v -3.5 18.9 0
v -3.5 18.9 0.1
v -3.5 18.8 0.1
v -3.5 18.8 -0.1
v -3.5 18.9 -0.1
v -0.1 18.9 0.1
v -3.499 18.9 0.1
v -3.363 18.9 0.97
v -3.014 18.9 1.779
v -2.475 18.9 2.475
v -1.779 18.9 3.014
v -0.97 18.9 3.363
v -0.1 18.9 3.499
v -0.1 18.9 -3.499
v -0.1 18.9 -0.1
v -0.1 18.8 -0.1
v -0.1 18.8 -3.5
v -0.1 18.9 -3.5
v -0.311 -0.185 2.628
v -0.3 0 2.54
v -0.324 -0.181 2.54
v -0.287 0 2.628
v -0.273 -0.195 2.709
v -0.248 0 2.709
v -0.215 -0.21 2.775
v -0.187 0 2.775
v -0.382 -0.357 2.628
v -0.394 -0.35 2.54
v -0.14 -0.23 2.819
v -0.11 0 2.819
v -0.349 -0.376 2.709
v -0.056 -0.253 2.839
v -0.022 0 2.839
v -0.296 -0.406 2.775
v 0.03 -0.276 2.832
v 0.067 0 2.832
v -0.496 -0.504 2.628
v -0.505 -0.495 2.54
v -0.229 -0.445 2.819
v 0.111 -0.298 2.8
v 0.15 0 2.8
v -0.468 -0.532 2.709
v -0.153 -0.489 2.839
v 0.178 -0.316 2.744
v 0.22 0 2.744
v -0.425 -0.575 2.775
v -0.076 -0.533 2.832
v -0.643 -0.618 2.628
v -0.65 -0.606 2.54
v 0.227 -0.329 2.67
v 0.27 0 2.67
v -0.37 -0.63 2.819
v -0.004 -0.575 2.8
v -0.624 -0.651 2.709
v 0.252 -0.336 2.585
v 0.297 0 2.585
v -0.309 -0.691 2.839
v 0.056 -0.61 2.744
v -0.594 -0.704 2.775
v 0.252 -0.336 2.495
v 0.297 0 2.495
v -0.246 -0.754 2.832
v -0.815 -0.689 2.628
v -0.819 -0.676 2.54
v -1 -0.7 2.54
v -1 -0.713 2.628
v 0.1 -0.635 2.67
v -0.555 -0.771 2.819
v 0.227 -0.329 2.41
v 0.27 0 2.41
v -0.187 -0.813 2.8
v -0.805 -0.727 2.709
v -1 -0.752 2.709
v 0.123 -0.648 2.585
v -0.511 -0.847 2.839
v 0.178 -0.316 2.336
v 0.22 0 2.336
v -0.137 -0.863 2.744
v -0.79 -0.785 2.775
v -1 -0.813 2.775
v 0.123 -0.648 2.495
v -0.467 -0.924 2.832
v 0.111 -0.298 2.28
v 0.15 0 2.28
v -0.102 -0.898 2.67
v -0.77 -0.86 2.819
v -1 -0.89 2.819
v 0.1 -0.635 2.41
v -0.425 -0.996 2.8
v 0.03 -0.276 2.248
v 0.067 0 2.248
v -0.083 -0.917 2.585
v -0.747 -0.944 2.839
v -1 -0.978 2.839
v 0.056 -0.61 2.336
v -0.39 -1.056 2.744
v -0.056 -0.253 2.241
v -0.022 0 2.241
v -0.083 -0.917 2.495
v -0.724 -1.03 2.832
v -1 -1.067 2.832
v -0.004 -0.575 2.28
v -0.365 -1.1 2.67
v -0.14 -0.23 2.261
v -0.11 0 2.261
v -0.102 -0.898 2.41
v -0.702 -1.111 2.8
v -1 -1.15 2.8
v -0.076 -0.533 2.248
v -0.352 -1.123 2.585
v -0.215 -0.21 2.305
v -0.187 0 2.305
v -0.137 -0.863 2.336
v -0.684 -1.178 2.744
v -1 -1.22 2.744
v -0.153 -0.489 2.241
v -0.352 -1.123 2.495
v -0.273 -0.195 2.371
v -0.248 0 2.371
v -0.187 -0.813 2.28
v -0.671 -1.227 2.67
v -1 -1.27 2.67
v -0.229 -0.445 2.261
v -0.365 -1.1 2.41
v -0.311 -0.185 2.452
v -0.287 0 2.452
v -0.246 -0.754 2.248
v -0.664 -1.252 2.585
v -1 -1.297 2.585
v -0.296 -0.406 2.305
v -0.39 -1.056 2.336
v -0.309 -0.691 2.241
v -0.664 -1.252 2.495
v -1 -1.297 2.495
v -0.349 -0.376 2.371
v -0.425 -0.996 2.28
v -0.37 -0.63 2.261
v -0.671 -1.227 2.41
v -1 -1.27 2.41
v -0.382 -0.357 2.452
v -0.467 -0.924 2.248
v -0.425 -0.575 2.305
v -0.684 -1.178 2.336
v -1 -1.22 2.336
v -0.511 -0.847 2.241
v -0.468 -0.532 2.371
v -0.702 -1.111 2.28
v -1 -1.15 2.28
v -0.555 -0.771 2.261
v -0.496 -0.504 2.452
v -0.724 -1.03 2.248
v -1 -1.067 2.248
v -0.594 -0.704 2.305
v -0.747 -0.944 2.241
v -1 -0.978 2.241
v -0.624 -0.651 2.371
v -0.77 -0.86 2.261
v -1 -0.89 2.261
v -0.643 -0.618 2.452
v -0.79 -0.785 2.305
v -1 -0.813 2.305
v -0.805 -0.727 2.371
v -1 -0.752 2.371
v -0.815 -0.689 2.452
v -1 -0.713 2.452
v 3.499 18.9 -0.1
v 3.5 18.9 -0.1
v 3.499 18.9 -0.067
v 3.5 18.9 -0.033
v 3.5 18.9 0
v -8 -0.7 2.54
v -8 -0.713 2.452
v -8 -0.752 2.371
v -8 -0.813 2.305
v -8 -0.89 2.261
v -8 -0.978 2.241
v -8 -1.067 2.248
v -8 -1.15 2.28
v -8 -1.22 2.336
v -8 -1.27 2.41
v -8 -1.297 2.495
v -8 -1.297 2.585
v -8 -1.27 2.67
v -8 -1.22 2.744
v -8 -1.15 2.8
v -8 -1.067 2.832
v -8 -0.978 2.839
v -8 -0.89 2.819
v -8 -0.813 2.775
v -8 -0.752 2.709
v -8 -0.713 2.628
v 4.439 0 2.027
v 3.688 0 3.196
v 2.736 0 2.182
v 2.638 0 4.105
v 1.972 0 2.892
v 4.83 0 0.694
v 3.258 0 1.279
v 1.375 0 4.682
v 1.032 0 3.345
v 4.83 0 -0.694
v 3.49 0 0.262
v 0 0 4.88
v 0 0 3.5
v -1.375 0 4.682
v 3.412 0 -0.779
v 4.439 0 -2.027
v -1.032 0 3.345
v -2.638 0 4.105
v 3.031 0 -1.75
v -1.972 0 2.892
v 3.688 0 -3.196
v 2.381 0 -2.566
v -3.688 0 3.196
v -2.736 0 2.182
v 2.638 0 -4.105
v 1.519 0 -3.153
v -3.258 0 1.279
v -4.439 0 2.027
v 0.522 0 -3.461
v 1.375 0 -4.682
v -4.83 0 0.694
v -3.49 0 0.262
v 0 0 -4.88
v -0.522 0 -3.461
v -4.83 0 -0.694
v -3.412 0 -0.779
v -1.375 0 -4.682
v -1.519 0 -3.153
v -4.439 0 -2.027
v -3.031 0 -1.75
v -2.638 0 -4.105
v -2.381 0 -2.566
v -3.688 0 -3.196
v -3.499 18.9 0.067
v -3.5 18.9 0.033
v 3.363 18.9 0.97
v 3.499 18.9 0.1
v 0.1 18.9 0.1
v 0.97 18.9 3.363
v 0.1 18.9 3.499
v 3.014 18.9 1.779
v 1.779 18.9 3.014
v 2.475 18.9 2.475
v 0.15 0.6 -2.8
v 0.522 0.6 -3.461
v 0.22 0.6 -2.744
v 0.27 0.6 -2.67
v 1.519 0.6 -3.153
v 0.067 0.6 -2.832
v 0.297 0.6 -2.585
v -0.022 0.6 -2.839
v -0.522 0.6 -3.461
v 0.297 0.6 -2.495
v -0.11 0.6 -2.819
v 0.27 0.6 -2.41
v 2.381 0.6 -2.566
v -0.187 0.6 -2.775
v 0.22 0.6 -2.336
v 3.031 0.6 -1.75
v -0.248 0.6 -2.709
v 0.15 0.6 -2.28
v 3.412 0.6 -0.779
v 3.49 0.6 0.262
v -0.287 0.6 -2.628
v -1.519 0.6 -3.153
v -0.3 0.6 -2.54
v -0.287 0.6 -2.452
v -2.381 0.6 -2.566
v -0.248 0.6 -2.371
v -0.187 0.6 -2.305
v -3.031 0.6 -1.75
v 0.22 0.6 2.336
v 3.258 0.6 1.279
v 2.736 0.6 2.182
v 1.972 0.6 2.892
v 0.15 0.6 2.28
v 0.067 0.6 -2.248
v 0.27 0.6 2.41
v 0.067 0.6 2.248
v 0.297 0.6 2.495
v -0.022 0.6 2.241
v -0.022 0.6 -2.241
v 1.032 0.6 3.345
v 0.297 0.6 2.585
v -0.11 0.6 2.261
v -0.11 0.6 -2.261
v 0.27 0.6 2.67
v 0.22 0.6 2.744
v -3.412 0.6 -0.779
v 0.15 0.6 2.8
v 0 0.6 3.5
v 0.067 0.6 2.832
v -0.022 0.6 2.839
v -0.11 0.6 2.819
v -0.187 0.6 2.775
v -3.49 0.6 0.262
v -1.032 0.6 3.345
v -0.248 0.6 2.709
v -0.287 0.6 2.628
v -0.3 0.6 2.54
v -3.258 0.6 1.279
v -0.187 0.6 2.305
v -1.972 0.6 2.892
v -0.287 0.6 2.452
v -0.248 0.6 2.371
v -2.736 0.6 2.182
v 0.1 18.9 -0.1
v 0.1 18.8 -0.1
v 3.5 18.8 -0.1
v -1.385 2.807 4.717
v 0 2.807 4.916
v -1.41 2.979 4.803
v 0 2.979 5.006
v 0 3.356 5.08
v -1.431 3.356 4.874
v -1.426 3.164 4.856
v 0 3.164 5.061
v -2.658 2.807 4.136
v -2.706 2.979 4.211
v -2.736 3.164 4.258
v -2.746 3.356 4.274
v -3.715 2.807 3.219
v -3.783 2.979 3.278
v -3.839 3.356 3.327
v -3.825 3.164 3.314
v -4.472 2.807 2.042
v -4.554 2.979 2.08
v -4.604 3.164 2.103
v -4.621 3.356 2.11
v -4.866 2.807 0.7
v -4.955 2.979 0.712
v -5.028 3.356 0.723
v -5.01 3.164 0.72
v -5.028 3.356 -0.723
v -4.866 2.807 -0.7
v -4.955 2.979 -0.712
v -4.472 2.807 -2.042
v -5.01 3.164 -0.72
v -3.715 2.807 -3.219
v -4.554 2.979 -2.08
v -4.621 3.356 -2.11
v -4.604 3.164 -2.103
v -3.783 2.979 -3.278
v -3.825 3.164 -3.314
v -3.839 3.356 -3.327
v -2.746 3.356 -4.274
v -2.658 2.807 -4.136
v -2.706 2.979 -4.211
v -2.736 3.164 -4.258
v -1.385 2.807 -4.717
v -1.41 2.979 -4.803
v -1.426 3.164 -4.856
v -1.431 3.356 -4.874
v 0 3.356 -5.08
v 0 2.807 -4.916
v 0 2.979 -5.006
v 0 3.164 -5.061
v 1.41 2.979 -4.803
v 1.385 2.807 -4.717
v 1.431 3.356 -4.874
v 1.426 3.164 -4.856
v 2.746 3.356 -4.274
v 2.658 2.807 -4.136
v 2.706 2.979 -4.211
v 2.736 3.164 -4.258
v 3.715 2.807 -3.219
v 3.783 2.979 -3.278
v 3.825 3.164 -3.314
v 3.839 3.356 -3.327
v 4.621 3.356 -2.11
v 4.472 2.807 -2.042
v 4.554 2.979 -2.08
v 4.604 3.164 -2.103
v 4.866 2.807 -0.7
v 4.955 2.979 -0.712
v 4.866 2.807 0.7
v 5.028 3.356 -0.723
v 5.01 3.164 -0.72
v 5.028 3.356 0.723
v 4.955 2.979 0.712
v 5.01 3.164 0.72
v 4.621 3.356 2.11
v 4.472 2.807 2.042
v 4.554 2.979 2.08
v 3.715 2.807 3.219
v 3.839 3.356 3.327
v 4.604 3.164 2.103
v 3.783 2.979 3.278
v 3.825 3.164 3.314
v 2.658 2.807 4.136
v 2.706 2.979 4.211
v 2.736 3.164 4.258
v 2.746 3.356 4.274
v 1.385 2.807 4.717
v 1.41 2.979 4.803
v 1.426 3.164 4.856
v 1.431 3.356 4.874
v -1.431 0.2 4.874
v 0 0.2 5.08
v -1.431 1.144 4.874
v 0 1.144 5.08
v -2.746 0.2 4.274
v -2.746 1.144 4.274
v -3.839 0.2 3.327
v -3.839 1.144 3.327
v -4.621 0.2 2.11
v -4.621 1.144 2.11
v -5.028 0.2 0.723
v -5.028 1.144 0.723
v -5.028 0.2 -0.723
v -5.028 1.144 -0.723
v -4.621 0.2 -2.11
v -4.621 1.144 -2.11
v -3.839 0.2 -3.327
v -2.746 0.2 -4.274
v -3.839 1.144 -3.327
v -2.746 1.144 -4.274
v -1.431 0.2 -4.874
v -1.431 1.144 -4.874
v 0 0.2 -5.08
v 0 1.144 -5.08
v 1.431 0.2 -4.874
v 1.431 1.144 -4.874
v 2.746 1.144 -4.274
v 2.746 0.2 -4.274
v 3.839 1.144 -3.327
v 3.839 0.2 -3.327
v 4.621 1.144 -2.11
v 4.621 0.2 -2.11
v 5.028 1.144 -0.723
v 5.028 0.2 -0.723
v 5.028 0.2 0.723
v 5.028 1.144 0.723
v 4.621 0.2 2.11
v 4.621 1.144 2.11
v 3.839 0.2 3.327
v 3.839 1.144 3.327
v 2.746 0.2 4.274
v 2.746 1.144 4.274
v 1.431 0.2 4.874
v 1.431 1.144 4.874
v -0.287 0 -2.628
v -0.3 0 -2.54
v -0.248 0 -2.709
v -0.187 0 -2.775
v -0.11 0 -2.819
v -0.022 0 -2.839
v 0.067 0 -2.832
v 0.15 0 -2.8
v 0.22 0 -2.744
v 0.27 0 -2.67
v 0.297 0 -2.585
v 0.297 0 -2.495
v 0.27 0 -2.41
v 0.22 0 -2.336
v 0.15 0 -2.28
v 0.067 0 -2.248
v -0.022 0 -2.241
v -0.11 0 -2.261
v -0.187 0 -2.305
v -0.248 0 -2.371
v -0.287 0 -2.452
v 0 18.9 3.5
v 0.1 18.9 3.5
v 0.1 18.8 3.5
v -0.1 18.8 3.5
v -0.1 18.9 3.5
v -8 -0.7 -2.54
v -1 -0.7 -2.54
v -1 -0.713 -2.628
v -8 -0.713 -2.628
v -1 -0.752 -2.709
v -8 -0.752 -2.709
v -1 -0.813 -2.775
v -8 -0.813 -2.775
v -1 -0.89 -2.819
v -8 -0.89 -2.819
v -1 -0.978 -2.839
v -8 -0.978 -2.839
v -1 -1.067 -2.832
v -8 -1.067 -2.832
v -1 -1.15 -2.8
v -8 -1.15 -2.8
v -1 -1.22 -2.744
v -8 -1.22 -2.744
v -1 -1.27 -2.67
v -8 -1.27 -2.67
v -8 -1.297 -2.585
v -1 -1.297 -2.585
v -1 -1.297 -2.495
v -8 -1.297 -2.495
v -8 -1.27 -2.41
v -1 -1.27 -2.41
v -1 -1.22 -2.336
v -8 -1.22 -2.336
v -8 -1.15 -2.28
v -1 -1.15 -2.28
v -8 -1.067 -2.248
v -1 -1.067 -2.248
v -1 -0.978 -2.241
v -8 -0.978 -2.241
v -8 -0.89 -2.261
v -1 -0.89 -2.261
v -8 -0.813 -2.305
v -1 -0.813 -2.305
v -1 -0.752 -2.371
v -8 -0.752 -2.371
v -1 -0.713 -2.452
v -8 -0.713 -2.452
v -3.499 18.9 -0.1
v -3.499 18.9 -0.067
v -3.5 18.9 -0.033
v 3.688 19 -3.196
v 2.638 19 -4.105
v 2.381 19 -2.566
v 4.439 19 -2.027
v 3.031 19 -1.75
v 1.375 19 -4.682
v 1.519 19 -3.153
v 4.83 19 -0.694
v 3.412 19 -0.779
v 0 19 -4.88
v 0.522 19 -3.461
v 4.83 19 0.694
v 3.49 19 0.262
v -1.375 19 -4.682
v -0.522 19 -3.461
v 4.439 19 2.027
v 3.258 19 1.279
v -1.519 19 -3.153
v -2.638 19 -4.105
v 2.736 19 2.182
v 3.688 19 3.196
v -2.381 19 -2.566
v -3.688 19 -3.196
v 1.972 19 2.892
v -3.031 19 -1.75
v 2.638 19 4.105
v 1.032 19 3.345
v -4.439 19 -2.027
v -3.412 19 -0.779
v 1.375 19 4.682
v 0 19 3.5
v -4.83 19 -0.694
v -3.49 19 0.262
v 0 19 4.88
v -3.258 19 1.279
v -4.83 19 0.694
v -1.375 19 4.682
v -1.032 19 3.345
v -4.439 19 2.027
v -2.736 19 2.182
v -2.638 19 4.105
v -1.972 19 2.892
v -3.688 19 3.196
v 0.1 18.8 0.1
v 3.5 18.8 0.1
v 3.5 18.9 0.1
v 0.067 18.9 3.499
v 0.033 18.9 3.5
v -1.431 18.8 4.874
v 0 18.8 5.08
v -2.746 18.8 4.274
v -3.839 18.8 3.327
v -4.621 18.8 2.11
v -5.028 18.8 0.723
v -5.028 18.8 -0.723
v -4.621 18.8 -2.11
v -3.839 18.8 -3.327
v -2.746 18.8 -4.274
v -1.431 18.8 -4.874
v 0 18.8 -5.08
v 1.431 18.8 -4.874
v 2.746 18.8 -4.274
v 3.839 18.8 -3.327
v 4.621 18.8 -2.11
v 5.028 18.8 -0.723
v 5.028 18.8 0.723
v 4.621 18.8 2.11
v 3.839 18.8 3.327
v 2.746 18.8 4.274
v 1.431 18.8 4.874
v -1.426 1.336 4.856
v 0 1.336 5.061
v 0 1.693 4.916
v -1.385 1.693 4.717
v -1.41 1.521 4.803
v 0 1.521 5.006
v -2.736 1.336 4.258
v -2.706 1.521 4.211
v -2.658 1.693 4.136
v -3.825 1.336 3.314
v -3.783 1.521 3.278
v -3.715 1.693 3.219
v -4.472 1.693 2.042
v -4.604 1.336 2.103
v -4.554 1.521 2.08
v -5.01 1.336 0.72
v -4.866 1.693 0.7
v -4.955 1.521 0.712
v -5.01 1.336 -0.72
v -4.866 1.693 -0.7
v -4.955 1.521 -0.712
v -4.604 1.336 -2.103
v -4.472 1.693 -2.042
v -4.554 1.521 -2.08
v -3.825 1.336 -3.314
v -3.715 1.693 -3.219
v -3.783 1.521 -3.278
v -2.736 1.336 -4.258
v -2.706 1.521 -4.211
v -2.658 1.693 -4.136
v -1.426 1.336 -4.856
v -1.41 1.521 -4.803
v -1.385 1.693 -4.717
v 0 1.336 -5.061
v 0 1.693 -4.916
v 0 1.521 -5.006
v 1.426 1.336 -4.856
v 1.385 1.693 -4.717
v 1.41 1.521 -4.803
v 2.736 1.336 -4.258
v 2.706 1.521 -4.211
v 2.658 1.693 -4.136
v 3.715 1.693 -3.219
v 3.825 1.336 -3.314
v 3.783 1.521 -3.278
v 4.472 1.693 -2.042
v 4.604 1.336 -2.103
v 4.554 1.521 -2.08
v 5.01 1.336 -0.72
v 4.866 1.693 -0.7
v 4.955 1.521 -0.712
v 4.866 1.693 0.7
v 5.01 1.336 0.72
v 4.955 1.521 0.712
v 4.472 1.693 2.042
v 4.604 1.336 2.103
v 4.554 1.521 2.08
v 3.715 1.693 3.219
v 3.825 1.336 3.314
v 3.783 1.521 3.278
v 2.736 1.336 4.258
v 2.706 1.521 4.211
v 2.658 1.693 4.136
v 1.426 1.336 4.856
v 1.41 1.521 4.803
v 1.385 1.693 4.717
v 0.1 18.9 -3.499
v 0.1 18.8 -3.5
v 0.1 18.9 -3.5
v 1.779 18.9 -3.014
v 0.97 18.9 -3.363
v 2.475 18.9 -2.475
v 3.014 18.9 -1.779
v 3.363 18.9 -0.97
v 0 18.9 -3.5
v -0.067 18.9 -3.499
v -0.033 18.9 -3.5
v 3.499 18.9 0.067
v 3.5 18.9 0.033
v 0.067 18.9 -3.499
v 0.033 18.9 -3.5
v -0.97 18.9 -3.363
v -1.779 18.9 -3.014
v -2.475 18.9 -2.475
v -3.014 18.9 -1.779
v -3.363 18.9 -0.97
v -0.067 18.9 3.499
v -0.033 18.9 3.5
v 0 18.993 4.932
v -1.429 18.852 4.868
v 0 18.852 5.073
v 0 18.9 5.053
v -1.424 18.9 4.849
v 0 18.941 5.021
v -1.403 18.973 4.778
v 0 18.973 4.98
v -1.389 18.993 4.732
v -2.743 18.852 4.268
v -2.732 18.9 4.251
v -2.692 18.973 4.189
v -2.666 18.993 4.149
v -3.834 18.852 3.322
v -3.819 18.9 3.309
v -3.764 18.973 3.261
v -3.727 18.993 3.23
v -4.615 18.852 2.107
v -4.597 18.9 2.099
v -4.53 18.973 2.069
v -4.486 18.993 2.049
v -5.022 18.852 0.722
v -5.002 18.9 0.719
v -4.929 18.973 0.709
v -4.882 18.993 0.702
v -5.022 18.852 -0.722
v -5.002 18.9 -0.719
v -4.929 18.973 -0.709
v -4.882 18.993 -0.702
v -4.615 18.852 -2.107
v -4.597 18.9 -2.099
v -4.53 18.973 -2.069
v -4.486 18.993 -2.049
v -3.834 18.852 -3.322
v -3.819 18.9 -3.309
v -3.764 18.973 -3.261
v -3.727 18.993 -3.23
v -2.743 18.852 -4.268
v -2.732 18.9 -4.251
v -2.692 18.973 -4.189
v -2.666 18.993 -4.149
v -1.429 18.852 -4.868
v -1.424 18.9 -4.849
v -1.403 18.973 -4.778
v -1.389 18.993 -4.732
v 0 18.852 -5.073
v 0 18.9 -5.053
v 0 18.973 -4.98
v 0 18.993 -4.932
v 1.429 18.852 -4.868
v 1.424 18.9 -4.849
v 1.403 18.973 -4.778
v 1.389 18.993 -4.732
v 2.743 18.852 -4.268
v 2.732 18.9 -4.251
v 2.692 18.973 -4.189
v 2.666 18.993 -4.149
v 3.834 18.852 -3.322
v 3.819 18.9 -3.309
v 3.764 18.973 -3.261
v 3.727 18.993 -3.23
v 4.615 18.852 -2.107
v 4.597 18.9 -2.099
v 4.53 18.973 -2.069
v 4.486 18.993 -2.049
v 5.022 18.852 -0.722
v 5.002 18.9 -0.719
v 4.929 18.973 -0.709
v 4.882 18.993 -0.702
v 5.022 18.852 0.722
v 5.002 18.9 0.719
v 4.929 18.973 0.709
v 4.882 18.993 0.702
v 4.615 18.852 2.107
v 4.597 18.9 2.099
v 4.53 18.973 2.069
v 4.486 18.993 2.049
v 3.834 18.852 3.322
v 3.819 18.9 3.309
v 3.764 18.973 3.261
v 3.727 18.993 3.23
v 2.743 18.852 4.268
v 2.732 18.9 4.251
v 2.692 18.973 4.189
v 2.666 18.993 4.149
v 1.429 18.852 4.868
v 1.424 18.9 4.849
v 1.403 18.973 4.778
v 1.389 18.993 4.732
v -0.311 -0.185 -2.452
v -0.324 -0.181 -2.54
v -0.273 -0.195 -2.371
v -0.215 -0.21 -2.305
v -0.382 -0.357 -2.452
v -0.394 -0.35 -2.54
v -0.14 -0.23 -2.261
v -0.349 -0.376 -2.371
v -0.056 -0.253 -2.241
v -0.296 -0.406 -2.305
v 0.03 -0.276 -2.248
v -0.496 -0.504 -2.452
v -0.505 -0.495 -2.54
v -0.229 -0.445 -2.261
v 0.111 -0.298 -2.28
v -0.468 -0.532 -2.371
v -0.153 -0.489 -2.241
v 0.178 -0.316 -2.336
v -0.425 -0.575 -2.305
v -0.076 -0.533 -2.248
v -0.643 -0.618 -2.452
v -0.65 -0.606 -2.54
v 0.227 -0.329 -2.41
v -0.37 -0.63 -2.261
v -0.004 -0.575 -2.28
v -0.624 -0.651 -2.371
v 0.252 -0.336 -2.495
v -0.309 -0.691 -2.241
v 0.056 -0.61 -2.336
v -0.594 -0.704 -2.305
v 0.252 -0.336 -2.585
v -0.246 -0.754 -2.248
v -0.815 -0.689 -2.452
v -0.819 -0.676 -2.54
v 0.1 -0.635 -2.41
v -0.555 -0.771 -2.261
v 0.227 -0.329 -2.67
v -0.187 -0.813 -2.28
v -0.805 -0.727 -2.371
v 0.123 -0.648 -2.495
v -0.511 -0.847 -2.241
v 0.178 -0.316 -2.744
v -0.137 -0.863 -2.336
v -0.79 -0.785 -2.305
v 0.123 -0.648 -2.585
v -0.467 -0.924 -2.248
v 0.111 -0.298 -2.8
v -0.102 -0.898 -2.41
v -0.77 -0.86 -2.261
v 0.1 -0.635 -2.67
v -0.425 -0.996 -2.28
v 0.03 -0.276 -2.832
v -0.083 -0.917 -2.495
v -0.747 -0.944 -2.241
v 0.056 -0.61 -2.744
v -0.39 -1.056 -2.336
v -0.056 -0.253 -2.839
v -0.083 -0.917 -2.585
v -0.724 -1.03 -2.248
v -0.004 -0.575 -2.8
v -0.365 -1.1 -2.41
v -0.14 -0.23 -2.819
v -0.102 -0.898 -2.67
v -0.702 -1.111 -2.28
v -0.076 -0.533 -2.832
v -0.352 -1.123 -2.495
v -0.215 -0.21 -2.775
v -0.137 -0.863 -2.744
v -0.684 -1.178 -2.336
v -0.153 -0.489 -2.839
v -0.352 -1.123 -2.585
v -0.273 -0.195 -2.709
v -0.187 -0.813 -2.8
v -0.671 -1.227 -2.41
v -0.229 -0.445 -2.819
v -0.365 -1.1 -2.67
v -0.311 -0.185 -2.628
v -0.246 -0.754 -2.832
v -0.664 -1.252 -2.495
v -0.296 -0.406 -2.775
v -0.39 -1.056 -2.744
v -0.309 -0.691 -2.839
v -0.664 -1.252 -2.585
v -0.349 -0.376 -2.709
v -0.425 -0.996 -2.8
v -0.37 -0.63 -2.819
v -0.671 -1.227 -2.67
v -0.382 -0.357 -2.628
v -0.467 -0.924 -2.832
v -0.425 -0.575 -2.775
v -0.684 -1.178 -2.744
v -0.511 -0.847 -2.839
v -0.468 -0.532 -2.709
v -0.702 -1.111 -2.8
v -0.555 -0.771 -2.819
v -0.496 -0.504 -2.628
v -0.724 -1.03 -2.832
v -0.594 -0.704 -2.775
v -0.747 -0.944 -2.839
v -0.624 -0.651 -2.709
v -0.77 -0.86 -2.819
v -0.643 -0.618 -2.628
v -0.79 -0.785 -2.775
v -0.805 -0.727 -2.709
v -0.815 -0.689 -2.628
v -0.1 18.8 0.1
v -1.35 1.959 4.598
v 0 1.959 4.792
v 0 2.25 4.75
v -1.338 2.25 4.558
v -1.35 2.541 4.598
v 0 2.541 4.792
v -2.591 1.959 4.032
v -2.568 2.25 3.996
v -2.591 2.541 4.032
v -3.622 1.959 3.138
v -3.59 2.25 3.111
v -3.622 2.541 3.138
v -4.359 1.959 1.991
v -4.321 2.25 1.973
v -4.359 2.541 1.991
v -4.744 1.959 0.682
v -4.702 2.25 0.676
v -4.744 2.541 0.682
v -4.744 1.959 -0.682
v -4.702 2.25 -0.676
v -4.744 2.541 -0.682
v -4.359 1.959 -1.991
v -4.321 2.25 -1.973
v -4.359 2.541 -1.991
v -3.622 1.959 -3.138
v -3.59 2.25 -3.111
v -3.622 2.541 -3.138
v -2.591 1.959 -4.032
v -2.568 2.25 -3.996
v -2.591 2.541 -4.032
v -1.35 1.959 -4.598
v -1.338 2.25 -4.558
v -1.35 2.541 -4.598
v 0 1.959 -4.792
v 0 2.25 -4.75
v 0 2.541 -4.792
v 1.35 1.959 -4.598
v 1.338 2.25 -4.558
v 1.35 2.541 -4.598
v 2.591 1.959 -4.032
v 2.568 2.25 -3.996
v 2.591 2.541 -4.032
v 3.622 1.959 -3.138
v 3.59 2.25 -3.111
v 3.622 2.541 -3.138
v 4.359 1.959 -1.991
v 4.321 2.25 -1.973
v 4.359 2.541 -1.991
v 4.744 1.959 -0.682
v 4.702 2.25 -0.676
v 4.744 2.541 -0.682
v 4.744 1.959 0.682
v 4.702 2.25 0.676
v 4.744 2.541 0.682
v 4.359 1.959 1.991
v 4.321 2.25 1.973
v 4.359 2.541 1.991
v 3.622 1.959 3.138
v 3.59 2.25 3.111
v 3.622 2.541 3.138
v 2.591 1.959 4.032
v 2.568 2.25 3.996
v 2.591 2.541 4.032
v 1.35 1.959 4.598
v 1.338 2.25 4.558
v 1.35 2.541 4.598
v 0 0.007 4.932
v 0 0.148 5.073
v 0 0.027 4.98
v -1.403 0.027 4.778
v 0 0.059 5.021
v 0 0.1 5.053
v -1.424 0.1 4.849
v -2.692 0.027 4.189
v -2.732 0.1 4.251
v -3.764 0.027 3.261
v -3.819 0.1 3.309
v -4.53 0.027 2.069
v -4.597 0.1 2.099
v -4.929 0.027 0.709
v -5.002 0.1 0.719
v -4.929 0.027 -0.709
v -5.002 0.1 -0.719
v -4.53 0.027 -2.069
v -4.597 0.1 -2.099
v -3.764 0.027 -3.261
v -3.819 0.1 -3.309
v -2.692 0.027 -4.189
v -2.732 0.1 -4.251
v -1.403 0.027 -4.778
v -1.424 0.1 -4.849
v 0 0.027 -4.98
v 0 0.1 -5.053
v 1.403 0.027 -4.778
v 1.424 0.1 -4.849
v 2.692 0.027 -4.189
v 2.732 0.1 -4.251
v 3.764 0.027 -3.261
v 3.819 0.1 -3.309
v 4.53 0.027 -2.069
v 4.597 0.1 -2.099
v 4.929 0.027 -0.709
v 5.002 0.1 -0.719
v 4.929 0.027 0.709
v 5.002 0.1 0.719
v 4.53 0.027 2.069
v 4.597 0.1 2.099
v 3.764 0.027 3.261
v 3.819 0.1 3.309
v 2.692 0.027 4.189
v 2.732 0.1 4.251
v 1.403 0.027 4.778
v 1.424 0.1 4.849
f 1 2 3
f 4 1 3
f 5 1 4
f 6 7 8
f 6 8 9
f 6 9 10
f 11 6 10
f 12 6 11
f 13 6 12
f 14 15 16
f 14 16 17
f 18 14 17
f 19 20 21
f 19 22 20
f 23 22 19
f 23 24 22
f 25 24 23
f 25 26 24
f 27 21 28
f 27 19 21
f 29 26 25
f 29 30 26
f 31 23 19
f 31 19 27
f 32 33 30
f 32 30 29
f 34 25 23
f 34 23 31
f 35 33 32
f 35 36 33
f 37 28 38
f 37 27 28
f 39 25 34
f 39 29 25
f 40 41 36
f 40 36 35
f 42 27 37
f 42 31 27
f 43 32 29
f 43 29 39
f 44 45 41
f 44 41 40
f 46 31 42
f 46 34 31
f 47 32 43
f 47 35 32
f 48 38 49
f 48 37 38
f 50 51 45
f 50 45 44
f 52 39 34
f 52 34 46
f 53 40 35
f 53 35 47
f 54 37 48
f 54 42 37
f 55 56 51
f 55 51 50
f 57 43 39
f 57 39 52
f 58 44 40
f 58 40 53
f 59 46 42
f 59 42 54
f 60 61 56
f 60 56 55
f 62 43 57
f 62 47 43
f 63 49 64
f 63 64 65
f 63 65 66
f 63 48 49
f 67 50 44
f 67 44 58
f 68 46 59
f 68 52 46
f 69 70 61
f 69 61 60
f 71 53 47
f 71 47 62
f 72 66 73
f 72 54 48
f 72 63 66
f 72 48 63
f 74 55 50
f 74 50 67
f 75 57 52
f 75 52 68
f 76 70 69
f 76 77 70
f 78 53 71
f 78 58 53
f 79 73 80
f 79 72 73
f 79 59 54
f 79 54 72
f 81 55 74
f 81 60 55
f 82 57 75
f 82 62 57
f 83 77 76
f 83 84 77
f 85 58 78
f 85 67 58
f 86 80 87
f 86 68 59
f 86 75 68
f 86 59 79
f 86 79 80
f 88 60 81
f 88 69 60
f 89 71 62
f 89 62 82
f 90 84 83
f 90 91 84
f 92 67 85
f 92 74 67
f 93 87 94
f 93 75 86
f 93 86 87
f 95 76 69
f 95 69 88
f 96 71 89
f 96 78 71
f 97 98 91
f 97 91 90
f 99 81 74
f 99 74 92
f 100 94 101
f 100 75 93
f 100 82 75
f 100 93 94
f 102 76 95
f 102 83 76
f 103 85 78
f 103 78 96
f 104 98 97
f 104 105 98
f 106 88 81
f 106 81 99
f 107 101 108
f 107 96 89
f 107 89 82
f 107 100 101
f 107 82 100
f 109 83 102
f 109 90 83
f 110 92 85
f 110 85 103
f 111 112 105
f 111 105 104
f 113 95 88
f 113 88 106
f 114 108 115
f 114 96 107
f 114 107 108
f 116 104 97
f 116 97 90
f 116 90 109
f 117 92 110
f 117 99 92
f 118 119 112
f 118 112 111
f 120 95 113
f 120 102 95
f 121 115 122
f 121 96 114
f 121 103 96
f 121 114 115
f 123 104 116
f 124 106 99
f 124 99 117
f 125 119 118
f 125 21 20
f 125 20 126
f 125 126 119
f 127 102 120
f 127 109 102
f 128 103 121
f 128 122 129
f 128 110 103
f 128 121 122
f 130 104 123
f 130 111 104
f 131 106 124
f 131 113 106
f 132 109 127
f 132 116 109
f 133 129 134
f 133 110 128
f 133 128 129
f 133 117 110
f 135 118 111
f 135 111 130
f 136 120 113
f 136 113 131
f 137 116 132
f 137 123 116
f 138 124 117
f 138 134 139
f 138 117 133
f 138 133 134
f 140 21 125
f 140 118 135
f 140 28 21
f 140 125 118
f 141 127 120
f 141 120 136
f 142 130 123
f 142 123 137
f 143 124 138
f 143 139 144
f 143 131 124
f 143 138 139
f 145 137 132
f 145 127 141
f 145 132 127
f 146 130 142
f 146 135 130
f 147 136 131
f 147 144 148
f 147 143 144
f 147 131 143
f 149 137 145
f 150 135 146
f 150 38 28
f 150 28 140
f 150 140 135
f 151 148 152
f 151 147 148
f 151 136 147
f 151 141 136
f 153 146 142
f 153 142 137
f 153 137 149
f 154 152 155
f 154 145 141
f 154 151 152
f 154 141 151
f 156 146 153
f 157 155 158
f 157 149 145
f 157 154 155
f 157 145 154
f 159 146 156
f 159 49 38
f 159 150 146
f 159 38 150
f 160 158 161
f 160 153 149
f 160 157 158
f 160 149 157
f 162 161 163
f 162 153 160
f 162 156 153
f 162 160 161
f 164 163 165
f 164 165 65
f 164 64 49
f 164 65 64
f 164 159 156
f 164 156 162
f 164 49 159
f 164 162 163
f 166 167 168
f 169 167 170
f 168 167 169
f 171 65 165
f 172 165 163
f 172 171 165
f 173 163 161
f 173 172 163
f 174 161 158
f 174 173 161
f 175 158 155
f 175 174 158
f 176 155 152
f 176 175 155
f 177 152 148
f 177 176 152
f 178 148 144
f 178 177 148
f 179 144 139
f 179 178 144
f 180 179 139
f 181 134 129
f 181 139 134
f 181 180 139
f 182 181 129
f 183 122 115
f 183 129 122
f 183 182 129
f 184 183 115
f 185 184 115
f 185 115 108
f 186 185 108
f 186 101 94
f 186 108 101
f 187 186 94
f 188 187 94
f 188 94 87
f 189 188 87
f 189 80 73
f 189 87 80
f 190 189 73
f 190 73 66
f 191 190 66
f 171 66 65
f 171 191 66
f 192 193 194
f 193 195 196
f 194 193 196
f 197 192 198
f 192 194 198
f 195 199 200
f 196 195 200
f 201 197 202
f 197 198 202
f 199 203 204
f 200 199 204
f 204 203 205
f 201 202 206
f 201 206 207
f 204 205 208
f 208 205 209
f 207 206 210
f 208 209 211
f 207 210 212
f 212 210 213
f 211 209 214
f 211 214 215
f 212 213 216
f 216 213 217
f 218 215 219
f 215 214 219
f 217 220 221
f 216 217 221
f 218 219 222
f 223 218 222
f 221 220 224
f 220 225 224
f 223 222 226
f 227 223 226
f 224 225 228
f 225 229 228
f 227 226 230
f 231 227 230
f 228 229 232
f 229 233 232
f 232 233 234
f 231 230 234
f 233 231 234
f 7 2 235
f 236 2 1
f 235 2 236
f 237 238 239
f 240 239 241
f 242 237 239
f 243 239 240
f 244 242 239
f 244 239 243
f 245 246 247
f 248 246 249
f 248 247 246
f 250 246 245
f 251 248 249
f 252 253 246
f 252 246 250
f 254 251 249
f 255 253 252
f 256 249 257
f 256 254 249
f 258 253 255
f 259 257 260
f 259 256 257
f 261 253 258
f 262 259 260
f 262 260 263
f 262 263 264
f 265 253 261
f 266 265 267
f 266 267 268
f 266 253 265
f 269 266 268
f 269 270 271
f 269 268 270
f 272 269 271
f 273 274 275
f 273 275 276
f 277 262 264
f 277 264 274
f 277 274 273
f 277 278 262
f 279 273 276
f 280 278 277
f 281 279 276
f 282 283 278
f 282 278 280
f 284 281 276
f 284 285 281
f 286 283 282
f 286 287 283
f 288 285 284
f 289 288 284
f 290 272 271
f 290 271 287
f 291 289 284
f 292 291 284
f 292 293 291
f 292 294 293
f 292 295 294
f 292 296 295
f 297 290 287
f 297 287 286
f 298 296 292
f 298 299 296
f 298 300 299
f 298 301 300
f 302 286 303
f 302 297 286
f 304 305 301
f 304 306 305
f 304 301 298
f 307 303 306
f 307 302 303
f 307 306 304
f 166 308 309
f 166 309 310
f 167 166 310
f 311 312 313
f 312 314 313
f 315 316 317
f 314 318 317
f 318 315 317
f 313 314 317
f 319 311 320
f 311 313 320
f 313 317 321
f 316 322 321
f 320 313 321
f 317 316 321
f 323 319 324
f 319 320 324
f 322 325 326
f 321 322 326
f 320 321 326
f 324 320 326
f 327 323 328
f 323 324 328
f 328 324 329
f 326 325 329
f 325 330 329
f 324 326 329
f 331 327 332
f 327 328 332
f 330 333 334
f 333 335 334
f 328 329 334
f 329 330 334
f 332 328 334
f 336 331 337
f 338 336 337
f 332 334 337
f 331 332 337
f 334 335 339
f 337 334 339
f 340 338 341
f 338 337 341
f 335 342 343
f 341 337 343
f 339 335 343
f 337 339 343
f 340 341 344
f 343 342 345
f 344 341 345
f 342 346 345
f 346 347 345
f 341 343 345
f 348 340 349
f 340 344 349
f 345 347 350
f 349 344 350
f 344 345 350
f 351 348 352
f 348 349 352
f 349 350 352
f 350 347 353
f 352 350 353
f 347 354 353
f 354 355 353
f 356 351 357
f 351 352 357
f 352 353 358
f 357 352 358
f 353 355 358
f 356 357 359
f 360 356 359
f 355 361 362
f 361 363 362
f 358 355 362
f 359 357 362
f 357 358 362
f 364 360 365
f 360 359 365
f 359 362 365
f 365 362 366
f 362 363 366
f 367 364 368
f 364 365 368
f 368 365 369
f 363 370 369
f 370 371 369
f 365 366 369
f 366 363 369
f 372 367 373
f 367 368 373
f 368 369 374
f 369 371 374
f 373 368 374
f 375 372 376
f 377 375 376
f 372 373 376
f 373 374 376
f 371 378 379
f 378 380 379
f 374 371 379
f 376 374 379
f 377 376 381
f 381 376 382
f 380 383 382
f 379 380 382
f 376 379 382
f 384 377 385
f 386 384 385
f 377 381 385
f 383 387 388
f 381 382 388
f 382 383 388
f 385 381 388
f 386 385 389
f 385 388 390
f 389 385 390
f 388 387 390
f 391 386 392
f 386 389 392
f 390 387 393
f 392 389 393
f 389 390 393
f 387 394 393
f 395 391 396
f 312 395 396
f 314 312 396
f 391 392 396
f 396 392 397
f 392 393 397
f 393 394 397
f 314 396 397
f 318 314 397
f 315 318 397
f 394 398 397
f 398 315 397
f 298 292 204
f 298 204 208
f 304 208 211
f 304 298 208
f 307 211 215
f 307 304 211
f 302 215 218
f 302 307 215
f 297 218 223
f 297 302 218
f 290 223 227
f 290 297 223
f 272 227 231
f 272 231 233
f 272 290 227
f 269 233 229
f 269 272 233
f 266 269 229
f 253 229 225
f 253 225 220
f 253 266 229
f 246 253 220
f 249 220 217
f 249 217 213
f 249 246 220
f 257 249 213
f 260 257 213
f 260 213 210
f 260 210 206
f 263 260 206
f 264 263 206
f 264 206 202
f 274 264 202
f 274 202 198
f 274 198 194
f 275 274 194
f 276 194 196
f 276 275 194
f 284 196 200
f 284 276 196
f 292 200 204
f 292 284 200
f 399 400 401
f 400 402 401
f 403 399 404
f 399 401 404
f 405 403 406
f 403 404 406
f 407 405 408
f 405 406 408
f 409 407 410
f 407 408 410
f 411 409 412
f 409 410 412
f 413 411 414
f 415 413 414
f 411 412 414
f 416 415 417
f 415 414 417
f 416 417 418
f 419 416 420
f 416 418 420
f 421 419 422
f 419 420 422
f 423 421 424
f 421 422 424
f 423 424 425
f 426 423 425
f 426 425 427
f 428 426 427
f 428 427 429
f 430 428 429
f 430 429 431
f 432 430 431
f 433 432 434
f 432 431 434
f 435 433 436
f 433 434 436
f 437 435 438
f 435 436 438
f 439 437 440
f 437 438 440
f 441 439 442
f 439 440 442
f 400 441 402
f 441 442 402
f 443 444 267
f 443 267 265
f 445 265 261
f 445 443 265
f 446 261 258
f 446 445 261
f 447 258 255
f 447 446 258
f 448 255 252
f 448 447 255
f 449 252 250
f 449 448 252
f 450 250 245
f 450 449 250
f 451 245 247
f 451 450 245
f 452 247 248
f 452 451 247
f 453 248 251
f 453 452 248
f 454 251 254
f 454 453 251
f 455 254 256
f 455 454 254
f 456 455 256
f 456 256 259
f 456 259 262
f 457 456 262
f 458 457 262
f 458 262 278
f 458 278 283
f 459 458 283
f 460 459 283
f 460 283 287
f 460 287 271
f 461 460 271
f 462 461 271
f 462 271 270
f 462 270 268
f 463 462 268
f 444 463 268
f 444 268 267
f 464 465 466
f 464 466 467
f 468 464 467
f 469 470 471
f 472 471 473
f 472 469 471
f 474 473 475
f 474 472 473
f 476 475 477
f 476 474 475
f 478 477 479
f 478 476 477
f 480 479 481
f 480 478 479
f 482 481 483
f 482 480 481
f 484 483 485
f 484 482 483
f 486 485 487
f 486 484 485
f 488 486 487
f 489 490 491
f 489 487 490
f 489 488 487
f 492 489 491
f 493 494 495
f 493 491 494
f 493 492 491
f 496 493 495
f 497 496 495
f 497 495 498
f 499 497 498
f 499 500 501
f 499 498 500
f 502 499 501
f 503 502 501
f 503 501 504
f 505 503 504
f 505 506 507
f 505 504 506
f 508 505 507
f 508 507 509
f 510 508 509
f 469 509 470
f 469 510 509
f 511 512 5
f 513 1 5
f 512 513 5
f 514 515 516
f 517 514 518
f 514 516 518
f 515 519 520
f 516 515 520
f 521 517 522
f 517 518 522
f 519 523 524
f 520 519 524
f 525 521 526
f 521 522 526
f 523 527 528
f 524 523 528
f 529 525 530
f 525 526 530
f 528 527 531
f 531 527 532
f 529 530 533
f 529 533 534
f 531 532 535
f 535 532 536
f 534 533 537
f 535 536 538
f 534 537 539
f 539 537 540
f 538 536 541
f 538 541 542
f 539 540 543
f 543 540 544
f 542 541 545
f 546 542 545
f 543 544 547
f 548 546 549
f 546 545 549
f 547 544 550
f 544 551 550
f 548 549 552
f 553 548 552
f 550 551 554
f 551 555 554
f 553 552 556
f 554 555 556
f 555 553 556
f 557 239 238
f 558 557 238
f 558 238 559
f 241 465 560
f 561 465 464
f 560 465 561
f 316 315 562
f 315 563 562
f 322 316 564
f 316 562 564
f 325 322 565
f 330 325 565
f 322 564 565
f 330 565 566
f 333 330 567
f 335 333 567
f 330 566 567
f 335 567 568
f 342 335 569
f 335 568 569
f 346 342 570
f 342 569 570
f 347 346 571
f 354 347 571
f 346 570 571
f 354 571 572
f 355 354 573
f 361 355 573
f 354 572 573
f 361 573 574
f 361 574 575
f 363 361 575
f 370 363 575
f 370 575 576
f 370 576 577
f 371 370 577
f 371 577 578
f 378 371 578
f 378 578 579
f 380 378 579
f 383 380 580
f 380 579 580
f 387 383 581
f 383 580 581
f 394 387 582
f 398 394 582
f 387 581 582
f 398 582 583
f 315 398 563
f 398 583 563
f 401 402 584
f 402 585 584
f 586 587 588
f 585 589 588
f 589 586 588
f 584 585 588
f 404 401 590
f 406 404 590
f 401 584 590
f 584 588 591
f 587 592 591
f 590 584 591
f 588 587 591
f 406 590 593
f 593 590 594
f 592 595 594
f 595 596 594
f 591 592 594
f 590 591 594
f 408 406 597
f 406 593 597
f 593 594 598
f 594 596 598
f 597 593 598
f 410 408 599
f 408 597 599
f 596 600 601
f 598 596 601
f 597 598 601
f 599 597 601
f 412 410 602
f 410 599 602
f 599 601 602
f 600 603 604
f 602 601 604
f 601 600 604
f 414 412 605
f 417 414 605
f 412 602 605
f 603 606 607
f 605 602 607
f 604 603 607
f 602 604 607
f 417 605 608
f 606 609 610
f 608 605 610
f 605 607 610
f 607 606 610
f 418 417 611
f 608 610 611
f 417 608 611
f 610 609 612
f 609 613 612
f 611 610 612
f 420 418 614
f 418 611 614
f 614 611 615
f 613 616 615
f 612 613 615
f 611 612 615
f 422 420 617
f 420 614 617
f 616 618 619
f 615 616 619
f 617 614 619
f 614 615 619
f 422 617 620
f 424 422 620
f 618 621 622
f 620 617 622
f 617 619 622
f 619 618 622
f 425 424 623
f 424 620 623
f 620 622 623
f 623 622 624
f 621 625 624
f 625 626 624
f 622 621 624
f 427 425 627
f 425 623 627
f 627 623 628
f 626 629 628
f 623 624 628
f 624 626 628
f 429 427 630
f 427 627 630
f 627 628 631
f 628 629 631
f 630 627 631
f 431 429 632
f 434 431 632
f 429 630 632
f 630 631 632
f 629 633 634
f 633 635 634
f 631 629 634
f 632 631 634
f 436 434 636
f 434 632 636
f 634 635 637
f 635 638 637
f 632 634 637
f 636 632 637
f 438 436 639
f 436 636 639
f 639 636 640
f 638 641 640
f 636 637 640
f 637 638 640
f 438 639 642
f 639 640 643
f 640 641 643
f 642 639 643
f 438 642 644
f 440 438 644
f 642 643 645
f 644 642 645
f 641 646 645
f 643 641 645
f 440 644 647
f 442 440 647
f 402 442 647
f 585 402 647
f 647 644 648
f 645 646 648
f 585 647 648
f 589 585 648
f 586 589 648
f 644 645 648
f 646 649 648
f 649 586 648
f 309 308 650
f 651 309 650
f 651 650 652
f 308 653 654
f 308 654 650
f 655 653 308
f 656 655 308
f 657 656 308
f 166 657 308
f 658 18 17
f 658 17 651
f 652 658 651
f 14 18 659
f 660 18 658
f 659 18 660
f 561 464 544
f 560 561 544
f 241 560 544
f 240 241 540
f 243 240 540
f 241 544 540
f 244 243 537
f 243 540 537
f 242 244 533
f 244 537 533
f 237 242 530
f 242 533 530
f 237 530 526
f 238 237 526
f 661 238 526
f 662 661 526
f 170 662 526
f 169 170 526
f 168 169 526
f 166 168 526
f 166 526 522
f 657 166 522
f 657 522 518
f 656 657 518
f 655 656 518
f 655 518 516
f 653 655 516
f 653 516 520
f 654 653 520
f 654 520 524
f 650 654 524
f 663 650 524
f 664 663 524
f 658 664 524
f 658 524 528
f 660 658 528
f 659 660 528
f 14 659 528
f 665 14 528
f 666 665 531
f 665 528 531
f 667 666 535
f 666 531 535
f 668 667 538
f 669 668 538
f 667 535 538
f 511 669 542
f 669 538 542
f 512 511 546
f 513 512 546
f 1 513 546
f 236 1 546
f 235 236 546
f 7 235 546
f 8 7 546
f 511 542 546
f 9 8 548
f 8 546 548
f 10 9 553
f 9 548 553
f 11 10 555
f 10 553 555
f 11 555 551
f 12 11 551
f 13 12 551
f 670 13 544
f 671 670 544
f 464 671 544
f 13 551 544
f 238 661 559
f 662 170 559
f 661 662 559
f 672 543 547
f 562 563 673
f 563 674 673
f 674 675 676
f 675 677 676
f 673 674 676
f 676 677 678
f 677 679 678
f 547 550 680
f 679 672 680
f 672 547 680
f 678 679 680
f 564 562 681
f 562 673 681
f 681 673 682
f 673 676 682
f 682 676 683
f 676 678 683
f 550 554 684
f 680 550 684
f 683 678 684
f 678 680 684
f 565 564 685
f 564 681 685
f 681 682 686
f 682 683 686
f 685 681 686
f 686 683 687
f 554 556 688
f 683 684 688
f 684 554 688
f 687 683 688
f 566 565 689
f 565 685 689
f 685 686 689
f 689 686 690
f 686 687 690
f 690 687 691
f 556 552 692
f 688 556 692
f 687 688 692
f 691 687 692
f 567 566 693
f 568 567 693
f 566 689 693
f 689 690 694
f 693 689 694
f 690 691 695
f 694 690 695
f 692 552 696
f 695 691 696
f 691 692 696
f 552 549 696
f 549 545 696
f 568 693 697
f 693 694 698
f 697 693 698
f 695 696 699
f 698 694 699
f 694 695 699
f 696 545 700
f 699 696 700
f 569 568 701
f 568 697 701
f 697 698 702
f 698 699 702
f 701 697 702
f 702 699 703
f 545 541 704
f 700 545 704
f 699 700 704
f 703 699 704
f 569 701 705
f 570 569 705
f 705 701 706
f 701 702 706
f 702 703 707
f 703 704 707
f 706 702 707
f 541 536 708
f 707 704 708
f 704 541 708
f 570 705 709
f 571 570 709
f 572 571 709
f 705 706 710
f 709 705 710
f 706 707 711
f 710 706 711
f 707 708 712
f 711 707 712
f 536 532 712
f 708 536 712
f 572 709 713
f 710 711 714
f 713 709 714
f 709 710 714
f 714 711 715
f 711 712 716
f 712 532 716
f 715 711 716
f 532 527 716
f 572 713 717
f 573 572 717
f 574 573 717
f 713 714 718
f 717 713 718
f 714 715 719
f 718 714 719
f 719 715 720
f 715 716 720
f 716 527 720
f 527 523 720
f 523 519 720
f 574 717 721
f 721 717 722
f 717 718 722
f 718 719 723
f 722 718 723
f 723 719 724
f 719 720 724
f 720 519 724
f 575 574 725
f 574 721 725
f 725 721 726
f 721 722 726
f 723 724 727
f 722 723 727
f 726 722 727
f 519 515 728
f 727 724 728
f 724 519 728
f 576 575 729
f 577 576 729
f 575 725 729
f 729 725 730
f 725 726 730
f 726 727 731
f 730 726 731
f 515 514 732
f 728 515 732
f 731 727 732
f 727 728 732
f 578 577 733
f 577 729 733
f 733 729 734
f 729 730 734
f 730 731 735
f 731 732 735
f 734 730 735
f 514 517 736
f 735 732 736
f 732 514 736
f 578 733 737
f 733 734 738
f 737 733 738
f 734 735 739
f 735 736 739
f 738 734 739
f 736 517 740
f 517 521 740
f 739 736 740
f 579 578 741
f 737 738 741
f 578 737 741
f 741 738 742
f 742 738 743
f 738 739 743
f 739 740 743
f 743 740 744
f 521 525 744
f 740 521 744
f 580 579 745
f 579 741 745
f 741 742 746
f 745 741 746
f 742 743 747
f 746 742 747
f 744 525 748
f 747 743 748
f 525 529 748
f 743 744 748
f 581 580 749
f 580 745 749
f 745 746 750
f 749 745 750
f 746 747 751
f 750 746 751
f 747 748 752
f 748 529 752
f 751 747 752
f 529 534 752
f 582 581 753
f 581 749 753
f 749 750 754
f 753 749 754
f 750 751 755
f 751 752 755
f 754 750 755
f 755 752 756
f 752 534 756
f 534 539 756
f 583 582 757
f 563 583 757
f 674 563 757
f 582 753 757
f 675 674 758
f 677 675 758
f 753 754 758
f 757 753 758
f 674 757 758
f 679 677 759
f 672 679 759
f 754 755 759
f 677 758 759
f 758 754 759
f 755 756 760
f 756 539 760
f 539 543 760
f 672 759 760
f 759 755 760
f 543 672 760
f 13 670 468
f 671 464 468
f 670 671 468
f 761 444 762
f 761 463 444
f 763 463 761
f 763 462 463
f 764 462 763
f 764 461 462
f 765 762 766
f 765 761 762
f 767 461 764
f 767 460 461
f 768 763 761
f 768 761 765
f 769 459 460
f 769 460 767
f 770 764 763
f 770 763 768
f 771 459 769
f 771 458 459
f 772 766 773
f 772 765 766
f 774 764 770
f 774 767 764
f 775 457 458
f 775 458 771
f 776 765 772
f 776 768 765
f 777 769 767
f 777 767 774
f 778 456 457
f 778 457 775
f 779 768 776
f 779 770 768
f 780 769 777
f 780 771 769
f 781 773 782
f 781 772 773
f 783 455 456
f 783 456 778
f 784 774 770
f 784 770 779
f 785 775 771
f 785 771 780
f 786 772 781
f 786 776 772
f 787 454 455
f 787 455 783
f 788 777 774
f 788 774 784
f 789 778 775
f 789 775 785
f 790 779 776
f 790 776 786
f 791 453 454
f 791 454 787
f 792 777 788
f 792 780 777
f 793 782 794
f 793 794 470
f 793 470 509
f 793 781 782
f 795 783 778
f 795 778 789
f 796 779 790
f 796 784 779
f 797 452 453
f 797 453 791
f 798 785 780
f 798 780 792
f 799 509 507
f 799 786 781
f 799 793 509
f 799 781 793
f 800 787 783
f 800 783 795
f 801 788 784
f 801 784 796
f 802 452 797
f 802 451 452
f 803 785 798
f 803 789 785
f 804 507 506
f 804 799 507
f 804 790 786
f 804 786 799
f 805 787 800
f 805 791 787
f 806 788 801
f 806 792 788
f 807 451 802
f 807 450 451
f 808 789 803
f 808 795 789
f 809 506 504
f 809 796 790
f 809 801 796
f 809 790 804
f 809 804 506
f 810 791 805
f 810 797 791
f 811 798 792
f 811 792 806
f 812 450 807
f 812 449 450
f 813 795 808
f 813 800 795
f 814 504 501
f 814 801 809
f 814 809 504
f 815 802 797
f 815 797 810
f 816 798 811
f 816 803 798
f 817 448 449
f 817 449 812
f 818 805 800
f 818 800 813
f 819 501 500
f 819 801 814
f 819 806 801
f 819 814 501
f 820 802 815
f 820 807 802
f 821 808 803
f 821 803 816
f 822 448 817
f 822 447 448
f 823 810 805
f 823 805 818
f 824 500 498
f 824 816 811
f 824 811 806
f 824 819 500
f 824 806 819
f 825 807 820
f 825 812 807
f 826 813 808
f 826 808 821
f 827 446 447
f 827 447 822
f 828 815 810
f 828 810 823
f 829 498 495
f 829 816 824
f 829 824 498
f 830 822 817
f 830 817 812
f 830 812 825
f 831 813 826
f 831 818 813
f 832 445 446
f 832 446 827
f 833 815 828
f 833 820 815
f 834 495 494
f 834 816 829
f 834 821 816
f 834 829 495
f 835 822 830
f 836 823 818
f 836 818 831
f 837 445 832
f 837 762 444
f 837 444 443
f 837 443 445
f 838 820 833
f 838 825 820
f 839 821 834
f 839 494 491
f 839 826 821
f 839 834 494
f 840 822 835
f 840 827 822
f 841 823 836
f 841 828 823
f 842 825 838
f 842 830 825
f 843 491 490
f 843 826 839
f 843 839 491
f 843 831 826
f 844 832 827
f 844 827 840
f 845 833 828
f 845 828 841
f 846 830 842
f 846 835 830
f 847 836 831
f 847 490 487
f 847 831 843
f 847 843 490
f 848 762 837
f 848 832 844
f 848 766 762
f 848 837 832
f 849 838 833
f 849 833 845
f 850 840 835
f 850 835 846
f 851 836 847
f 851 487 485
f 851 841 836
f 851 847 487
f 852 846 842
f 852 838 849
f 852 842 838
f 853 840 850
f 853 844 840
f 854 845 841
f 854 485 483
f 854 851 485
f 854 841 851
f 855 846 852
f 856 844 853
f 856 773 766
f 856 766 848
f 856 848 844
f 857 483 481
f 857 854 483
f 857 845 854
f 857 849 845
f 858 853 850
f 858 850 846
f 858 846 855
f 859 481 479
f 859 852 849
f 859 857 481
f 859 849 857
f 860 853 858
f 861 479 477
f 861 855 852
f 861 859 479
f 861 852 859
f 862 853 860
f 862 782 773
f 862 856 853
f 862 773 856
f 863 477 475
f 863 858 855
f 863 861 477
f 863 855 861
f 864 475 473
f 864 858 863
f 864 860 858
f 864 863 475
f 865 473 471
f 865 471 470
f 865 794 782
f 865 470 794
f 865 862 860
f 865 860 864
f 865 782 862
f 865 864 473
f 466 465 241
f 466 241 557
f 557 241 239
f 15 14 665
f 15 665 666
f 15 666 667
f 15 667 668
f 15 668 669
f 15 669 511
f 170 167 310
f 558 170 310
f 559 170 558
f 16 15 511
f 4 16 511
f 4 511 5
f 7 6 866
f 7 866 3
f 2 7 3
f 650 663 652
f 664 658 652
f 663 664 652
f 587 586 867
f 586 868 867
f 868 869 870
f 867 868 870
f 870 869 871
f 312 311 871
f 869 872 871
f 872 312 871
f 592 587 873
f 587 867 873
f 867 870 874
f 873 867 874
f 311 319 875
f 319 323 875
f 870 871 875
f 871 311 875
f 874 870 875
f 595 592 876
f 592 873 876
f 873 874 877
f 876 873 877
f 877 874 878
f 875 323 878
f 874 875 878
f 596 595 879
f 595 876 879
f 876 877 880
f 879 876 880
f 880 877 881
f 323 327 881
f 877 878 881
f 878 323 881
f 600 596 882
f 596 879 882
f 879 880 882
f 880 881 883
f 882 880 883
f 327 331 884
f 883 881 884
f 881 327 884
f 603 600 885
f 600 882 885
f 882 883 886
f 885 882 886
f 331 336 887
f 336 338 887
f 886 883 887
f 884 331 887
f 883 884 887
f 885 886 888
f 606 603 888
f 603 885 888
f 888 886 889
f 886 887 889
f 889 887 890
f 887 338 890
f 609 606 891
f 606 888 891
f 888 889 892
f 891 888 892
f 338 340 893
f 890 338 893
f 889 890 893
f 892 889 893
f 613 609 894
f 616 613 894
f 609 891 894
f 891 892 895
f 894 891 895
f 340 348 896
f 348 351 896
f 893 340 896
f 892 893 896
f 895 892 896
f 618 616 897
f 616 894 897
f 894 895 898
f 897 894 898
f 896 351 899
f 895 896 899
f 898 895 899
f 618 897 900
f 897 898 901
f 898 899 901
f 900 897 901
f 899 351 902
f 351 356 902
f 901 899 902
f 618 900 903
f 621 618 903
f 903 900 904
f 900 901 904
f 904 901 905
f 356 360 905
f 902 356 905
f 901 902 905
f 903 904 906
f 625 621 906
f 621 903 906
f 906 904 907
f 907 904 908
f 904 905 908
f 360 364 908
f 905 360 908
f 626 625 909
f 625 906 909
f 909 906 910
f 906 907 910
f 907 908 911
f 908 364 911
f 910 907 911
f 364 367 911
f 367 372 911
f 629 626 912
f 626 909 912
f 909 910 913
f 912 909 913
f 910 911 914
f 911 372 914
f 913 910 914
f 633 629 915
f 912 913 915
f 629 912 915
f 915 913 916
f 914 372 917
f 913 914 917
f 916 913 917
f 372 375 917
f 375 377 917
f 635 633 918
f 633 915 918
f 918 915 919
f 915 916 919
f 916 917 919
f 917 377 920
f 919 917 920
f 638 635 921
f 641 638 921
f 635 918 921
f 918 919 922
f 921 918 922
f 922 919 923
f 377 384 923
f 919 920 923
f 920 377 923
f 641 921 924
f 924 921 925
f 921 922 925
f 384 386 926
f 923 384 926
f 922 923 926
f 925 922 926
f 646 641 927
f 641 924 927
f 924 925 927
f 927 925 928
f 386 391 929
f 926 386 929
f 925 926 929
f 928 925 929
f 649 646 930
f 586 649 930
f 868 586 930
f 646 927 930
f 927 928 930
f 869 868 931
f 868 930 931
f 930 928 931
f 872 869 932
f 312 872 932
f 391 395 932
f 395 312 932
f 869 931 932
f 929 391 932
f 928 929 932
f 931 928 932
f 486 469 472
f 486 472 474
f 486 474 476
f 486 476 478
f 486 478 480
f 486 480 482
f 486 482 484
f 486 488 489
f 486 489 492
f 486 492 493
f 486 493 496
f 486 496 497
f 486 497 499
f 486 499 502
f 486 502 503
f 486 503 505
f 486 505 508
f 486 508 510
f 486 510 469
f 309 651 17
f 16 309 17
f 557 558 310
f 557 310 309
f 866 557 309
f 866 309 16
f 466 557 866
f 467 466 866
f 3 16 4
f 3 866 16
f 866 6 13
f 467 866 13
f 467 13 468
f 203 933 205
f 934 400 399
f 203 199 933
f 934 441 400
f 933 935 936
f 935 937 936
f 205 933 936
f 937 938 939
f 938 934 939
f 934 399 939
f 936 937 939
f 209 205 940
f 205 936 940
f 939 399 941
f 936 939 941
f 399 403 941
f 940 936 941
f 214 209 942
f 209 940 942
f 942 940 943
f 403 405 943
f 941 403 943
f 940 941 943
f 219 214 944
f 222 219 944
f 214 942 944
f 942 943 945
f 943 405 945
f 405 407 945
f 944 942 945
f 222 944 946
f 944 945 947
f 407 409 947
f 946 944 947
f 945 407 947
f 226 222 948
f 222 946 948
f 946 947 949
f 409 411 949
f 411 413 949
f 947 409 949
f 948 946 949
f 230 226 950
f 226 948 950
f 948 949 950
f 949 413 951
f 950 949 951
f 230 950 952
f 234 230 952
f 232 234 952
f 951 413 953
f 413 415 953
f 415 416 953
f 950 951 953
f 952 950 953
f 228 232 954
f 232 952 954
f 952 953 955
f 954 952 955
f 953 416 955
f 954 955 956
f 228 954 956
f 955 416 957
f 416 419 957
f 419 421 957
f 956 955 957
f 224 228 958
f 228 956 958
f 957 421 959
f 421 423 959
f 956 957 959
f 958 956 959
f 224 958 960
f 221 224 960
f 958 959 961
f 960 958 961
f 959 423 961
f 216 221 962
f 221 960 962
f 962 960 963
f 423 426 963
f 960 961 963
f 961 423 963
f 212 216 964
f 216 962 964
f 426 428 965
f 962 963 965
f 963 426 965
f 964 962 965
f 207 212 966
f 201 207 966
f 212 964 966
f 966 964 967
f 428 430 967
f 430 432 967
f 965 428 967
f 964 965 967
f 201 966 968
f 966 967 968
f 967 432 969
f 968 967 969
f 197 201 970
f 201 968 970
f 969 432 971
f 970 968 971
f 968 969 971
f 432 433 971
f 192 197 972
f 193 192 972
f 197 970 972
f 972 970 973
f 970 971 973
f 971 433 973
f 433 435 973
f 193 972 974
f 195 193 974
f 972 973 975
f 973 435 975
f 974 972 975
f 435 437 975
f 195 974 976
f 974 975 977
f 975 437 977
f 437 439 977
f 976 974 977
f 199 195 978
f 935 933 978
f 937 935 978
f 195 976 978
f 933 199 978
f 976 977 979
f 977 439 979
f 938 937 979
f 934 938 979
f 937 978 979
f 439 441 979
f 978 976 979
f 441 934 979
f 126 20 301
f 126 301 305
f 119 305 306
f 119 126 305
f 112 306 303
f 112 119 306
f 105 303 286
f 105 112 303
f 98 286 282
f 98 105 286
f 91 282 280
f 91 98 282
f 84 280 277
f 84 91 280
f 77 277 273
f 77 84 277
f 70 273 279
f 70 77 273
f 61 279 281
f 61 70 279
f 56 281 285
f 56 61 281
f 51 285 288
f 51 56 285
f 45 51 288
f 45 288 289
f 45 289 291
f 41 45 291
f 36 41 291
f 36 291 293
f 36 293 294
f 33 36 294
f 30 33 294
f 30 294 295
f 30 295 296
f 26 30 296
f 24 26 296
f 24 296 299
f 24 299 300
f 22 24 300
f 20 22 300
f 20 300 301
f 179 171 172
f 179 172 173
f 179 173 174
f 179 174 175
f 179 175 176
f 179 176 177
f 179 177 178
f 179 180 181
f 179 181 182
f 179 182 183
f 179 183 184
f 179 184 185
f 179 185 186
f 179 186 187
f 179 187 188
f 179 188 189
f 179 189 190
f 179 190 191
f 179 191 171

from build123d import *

# Parameters (mm, degrees)
SZKIC2_R                   = 3.5
WYTNIJ_WYCI_GNI_CIE1_DEPTH = 0.1
SZKIC3_W                   = 0.2
SZKIC3_H                   = 3.5
WYTNIJ_WYCI_GNI_CIE2_DEPTH = 0.1
SZYK_KO_OWY1_COUNT         = 4
WYTNIJ_WYCI_GNI_CIE3_START = -0.6
SZKIC4_R                   = 3.5
WYTNIJ_WYCI_GNI_CIE3_DEPTH = 0.6
SZKIC7_2_R                 = 0.3


with BuildPart() as part:
    # Szkic1 → Obrót1 (revolve)
    with BuildSketch(Plane(origin=(0, 0, 0), x_dir=(0, 0, -1), z_dir=(1, 0, 0))):
        with BuildLine():
            Line((0, 0), (4.88, 0))
            ThreePointArc((4.88, 0), (5.021421356, 0.058578644), (5.08, 0.2))
            Line((5.08, 0.2), (5.08, 1.143679374))
            ThreePointArc((5.08, 1.143679374), (5.038185781, 1.430146031), (4.916232342, 1.692708278))
            ThreePointArc((4.916232342, 1.692708278), (4.75, 2.25), (4.916232342, 2.807291722))
            ThreePointArc((4.916232342, 2.807291722), (5.038185781, 3.069853969), (5.08, 3.356320626))
            Line((5.08, 3.356320626), (5.08, 18.8))
            ThreePointArc((5.08, 18.8), (5.021421356, 18.941421356), (4.88, 19))
            Line((4.88, 19), (0, 19))
            Line((0, 19), (0, 0))
        make_face()
    revolve(axis=Axis((0, 19, 0), (0, -1, 0)))

    # Szkic2 → Wytnij-wyciągnięcie1 (cut)
    with BuildSketch(Plane(origin=(0, 19, 0), x_dir=(1, 0, 0), z_dir=(0, 1, 0))):
        Circle(SZKIC2_R)
    extrude(amount=-WYTNIJ_WYCI_GNI_CIE1_DEPTH, mode=Mode.SUBTRACT)

    # Szkic3 → Wytnij-wyciągnięcie2 (cut)
    with BuildSketch(Plane(origin=(0, 18.9, 0), x_dir=(1, 0, 0), z_dir=(0, 1, 0))):
        with Locations((0, 1.75)):
            Rectangle(SZKIC3_W, SZKIC3_H)
    wytnij_wyci_gni_cie2 = extrude(amount=-WYTNIJ_WYCI_GNI_CIE2_DEPTH, mode=Mode.SUBTRACT)

    # Szyk kołowy1: Wytnij-wyciągnięcie2 ×4 about axis
    szyk_ko_owy1_axis = Axis((0, 0, 0), (0, 1, 0))
    for i in range(1, SZYK_KO_OWY1_COUNT):
        add(wytnij_wyci_gni_cie2.rotate(szyk_ko_owy1_axis, i * 360 / SZYK_KO_OWY1_COUNT), mode=Mode.SUBTRACT)

    # Szkic4 → Wytnij-wyciągnięcie3 (cut)
    with BuildSketch(Plane.XZ.offset(WYTNIJ_WYCI_GNI_CIE3_START)):
        Circle(SZKIC4_R)
    extrude(amount=WYTNIJ_WYCI_GNI_CIE3_DEPTH, mode=Mode.SUBTRACT)

    # По траектории1: sweep along a path in Эскиз1
    with BuildLine(Plane.XY) as sweep_1_path:
        Line((0, 0.6), (0, 0))
        ThreePointArc((0, 0), (-0.292893219, -0.707106781), (-1, -1))
        Line((-1, -1), (-8, -1))
    # Szkic7<2> → По траектории1 (sweep)
    with BuildSketch(Plane(origin=(0, 0.6, 0), x_dir=(-1, 0, 0), z_dir=(0, -1, 0))):
        with Locations((0, -2.54)):
            Circle(SZKIC7_2_R)
        with Locations((0, 2.54)):
            Circle(SZKIC7_2_R)
    sweep(path=sweep_1_path.line)


solid = part.part
